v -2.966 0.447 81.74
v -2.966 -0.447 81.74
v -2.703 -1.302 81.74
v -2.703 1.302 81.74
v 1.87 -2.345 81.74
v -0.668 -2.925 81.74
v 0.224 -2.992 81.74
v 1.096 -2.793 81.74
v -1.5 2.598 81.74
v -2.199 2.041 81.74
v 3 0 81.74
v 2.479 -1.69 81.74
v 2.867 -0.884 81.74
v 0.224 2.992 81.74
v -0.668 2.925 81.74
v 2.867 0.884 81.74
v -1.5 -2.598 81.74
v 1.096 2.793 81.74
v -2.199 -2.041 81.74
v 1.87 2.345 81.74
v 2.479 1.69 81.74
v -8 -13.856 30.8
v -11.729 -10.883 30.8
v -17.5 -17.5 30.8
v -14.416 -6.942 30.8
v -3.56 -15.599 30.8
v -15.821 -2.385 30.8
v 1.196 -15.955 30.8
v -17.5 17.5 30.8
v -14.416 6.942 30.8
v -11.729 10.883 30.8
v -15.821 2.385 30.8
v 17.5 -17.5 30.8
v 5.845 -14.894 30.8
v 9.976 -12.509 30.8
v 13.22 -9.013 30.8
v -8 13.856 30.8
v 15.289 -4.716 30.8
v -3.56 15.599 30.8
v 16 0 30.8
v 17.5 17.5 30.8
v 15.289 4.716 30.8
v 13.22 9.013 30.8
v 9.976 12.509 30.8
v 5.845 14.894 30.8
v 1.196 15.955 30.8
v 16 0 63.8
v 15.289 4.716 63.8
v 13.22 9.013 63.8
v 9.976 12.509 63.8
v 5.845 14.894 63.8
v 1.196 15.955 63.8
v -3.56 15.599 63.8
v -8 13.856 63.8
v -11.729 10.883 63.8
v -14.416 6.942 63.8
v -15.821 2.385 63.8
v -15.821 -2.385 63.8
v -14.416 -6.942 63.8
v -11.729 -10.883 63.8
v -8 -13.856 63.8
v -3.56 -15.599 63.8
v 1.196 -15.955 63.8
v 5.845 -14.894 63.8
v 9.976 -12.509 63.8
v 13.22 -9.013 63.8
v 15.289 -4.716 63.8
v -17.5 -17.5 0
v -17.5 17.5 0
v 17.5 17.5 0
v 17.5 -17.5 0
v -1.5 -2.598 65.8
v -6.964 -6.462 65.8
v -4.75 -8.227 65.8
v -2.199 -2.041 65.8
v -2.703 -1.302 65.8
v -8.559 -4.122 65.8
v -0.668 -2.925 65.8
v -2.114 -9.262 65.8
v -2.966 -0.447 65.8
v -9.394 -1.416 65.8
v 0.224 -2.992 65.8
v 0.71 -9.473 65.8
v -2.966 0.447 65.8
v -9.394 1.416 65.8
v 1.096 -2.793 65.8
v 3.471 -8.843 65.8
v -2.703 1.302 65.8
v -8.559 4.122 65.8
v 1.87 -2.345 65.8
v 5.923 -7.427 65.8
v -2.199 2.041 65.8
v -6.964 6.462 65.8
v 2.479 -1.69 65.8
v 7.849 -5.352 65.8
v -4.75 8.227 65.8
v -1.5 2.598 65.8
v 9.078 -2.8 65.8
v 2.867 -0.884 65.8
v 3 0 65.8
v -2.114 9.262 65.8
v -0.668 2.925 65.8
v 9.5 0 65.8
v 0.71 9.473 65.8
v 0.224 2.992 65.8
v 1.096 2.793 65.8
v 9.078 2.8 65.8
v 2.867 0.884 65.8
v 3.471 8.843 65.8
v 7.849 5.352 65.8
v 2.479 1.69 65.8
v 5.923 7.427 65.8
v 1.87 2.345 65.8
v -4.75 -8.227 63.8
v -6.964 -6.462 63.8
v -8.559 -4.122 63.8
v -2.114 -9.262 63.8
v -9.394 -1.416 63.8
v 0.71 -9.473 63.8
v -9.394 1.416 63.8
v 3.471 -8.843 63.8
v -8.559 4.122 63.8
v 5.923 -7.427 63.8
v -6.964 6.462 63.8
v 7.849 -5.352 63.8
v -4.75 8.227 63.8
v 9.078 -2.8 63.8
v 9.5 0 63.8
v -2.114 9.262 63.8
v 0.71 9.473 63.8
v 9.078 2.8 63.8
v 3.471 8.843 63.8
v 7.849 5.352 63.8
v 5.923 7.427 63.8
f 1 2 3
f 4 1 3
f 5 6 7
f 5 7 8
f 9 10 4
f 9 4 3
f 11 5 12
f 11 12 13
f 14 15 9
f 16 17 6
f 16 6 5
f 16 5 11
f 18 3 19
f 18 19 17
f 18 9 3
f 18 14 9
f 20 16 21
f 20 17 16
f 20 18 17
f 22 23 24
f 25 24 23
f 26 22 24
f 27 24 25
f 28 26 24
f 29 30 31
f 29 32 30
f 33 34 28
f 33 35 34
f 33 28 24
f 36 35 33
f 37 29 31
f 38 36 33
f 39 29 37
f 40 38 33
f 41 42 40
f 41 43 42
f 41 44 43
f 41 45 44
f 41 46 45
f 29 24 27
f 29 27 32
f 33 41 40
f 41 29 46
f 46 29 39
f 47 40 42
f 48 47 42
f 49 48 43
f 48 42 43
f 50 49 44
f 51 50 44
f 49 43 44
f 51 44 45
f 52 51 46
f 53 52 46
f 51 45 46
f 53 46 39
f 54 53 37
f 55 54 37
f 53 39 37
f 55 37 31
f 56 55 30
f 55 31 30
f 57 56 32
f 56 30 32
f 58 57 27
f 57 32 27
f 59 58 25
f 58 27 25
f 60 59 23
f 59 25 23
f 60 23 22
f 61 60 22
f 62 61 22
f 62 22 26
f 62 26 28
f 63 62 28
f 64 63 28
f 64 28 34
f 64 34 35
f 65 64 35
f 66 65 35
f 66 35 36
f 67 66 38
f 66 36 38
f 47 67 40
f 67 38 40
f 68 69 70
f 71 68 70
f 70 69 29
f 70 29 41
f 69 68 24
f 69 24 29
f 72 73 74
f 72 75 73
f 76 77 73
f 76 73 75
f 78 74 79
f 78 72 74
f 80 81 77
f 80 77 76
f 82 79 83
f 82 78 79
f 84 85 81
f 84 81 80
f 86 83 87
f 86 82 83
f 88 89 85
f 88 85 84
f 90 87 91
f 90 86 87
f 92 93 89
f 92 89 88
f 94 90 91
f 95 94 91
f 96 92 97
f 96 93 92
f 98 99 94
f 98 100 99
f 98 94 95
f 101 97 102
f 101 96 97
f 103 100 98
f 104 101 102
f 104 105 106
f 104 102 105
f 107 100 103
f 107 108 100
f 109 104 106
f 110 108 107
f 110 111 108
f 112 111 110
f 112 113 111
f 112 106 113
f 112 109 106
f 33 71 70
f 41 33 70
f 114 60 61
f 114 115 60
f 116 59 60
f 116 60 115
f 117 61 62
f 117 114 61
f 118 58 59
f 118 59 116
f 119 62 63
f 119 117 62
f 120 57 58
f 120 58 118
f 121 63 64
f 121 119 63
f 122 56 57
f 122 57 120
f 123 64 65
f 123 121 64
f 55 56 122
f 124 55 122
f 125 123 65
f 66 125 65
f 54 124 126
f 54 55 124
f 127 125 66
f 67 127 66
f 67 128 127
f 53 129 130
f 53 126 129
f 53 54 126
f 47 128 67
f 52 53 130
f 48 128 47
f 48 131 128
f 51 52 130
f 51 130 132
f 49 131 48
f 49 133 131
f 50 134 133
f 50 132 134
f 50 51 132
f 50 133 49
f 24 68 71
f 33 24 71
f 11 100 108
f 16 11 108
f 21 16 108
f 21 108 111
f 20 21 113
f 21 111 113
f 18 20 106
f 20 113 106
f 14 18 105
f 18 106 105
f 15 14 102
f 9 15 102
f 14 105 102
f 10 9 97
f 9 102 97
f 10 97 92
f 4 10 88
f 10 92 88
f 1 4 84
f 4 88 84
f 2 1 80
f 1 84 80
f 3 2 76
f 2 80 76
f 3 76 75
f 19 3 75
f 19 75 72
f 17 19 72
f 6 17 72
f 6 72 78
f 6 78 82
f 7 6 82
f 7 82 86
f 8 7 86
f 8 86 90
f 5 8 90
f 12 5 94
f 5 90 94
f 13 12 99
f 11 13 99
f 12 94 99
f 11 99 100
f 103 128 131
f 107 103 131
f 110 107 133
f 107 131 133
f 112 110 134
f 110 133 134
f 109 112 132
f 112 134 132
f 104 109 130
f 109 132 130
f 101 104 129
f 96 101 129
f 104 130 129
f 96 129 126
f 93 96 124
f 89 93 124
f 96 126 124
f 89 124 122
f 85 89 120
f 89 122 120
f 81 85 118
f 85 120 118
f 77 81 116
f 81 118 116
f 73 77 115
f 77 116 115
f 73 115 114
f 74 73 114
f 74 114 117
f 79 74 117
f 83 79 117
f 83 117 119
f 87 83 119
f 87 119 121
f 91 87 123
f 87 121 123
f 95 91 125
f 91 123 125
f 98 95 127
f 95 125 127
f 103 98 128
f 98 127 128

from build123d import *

# Parameters (mm, degrees)
SKETCH1_W           = 35
SKETCH1_H           = 35
BOSS_EXTRUDE1_DEPTH = 30.8
SKETCH2_R           = 16
BOSS_EXTRUDE2_DEPTH = 33
SKETCH4_R           = 9.5
BOSS_EXTRUDE4_DEPTH = 2
SKETCH3_R           = 3
BOSS_EXTRUDE3_DEPTH = 15.94


with BuildPart() as part:
    # Sketch1 → Boss-Extrude1 (new body)
    with BuildSketch(Plane.XY):
        Rectangle(SKETCH1_W, SKETCH1_H)
    extrude(amount=BOSS_EXTRUDE1_DEPTH)

    # Sketch2 → Boss-Extrude2 (add)
    with BuildSketch(Plane.XY.offset(30.8)):
        Circle(SKETCH2_R)
    extrude(amount=BOSS_EXTRUDE2_DEPTH)

    # Sketch4 → Boss-Extrude4 (add)
    with BuildSketch(Plane.XY.offset(63.8)):
        Circle(SKETCH4_R)
    extrude(amount=BOSS_EXTRUDE4_DEPTH)

    # Sketch3 → Boss-Extrude3 (add)
    with BuildSketch(Plane.XY.offset(65.8)):
        Circle(SKETCH3_R)
    extrude(amount=BOSS_EXTRUDE3_DEPTH)


solid = part.part
